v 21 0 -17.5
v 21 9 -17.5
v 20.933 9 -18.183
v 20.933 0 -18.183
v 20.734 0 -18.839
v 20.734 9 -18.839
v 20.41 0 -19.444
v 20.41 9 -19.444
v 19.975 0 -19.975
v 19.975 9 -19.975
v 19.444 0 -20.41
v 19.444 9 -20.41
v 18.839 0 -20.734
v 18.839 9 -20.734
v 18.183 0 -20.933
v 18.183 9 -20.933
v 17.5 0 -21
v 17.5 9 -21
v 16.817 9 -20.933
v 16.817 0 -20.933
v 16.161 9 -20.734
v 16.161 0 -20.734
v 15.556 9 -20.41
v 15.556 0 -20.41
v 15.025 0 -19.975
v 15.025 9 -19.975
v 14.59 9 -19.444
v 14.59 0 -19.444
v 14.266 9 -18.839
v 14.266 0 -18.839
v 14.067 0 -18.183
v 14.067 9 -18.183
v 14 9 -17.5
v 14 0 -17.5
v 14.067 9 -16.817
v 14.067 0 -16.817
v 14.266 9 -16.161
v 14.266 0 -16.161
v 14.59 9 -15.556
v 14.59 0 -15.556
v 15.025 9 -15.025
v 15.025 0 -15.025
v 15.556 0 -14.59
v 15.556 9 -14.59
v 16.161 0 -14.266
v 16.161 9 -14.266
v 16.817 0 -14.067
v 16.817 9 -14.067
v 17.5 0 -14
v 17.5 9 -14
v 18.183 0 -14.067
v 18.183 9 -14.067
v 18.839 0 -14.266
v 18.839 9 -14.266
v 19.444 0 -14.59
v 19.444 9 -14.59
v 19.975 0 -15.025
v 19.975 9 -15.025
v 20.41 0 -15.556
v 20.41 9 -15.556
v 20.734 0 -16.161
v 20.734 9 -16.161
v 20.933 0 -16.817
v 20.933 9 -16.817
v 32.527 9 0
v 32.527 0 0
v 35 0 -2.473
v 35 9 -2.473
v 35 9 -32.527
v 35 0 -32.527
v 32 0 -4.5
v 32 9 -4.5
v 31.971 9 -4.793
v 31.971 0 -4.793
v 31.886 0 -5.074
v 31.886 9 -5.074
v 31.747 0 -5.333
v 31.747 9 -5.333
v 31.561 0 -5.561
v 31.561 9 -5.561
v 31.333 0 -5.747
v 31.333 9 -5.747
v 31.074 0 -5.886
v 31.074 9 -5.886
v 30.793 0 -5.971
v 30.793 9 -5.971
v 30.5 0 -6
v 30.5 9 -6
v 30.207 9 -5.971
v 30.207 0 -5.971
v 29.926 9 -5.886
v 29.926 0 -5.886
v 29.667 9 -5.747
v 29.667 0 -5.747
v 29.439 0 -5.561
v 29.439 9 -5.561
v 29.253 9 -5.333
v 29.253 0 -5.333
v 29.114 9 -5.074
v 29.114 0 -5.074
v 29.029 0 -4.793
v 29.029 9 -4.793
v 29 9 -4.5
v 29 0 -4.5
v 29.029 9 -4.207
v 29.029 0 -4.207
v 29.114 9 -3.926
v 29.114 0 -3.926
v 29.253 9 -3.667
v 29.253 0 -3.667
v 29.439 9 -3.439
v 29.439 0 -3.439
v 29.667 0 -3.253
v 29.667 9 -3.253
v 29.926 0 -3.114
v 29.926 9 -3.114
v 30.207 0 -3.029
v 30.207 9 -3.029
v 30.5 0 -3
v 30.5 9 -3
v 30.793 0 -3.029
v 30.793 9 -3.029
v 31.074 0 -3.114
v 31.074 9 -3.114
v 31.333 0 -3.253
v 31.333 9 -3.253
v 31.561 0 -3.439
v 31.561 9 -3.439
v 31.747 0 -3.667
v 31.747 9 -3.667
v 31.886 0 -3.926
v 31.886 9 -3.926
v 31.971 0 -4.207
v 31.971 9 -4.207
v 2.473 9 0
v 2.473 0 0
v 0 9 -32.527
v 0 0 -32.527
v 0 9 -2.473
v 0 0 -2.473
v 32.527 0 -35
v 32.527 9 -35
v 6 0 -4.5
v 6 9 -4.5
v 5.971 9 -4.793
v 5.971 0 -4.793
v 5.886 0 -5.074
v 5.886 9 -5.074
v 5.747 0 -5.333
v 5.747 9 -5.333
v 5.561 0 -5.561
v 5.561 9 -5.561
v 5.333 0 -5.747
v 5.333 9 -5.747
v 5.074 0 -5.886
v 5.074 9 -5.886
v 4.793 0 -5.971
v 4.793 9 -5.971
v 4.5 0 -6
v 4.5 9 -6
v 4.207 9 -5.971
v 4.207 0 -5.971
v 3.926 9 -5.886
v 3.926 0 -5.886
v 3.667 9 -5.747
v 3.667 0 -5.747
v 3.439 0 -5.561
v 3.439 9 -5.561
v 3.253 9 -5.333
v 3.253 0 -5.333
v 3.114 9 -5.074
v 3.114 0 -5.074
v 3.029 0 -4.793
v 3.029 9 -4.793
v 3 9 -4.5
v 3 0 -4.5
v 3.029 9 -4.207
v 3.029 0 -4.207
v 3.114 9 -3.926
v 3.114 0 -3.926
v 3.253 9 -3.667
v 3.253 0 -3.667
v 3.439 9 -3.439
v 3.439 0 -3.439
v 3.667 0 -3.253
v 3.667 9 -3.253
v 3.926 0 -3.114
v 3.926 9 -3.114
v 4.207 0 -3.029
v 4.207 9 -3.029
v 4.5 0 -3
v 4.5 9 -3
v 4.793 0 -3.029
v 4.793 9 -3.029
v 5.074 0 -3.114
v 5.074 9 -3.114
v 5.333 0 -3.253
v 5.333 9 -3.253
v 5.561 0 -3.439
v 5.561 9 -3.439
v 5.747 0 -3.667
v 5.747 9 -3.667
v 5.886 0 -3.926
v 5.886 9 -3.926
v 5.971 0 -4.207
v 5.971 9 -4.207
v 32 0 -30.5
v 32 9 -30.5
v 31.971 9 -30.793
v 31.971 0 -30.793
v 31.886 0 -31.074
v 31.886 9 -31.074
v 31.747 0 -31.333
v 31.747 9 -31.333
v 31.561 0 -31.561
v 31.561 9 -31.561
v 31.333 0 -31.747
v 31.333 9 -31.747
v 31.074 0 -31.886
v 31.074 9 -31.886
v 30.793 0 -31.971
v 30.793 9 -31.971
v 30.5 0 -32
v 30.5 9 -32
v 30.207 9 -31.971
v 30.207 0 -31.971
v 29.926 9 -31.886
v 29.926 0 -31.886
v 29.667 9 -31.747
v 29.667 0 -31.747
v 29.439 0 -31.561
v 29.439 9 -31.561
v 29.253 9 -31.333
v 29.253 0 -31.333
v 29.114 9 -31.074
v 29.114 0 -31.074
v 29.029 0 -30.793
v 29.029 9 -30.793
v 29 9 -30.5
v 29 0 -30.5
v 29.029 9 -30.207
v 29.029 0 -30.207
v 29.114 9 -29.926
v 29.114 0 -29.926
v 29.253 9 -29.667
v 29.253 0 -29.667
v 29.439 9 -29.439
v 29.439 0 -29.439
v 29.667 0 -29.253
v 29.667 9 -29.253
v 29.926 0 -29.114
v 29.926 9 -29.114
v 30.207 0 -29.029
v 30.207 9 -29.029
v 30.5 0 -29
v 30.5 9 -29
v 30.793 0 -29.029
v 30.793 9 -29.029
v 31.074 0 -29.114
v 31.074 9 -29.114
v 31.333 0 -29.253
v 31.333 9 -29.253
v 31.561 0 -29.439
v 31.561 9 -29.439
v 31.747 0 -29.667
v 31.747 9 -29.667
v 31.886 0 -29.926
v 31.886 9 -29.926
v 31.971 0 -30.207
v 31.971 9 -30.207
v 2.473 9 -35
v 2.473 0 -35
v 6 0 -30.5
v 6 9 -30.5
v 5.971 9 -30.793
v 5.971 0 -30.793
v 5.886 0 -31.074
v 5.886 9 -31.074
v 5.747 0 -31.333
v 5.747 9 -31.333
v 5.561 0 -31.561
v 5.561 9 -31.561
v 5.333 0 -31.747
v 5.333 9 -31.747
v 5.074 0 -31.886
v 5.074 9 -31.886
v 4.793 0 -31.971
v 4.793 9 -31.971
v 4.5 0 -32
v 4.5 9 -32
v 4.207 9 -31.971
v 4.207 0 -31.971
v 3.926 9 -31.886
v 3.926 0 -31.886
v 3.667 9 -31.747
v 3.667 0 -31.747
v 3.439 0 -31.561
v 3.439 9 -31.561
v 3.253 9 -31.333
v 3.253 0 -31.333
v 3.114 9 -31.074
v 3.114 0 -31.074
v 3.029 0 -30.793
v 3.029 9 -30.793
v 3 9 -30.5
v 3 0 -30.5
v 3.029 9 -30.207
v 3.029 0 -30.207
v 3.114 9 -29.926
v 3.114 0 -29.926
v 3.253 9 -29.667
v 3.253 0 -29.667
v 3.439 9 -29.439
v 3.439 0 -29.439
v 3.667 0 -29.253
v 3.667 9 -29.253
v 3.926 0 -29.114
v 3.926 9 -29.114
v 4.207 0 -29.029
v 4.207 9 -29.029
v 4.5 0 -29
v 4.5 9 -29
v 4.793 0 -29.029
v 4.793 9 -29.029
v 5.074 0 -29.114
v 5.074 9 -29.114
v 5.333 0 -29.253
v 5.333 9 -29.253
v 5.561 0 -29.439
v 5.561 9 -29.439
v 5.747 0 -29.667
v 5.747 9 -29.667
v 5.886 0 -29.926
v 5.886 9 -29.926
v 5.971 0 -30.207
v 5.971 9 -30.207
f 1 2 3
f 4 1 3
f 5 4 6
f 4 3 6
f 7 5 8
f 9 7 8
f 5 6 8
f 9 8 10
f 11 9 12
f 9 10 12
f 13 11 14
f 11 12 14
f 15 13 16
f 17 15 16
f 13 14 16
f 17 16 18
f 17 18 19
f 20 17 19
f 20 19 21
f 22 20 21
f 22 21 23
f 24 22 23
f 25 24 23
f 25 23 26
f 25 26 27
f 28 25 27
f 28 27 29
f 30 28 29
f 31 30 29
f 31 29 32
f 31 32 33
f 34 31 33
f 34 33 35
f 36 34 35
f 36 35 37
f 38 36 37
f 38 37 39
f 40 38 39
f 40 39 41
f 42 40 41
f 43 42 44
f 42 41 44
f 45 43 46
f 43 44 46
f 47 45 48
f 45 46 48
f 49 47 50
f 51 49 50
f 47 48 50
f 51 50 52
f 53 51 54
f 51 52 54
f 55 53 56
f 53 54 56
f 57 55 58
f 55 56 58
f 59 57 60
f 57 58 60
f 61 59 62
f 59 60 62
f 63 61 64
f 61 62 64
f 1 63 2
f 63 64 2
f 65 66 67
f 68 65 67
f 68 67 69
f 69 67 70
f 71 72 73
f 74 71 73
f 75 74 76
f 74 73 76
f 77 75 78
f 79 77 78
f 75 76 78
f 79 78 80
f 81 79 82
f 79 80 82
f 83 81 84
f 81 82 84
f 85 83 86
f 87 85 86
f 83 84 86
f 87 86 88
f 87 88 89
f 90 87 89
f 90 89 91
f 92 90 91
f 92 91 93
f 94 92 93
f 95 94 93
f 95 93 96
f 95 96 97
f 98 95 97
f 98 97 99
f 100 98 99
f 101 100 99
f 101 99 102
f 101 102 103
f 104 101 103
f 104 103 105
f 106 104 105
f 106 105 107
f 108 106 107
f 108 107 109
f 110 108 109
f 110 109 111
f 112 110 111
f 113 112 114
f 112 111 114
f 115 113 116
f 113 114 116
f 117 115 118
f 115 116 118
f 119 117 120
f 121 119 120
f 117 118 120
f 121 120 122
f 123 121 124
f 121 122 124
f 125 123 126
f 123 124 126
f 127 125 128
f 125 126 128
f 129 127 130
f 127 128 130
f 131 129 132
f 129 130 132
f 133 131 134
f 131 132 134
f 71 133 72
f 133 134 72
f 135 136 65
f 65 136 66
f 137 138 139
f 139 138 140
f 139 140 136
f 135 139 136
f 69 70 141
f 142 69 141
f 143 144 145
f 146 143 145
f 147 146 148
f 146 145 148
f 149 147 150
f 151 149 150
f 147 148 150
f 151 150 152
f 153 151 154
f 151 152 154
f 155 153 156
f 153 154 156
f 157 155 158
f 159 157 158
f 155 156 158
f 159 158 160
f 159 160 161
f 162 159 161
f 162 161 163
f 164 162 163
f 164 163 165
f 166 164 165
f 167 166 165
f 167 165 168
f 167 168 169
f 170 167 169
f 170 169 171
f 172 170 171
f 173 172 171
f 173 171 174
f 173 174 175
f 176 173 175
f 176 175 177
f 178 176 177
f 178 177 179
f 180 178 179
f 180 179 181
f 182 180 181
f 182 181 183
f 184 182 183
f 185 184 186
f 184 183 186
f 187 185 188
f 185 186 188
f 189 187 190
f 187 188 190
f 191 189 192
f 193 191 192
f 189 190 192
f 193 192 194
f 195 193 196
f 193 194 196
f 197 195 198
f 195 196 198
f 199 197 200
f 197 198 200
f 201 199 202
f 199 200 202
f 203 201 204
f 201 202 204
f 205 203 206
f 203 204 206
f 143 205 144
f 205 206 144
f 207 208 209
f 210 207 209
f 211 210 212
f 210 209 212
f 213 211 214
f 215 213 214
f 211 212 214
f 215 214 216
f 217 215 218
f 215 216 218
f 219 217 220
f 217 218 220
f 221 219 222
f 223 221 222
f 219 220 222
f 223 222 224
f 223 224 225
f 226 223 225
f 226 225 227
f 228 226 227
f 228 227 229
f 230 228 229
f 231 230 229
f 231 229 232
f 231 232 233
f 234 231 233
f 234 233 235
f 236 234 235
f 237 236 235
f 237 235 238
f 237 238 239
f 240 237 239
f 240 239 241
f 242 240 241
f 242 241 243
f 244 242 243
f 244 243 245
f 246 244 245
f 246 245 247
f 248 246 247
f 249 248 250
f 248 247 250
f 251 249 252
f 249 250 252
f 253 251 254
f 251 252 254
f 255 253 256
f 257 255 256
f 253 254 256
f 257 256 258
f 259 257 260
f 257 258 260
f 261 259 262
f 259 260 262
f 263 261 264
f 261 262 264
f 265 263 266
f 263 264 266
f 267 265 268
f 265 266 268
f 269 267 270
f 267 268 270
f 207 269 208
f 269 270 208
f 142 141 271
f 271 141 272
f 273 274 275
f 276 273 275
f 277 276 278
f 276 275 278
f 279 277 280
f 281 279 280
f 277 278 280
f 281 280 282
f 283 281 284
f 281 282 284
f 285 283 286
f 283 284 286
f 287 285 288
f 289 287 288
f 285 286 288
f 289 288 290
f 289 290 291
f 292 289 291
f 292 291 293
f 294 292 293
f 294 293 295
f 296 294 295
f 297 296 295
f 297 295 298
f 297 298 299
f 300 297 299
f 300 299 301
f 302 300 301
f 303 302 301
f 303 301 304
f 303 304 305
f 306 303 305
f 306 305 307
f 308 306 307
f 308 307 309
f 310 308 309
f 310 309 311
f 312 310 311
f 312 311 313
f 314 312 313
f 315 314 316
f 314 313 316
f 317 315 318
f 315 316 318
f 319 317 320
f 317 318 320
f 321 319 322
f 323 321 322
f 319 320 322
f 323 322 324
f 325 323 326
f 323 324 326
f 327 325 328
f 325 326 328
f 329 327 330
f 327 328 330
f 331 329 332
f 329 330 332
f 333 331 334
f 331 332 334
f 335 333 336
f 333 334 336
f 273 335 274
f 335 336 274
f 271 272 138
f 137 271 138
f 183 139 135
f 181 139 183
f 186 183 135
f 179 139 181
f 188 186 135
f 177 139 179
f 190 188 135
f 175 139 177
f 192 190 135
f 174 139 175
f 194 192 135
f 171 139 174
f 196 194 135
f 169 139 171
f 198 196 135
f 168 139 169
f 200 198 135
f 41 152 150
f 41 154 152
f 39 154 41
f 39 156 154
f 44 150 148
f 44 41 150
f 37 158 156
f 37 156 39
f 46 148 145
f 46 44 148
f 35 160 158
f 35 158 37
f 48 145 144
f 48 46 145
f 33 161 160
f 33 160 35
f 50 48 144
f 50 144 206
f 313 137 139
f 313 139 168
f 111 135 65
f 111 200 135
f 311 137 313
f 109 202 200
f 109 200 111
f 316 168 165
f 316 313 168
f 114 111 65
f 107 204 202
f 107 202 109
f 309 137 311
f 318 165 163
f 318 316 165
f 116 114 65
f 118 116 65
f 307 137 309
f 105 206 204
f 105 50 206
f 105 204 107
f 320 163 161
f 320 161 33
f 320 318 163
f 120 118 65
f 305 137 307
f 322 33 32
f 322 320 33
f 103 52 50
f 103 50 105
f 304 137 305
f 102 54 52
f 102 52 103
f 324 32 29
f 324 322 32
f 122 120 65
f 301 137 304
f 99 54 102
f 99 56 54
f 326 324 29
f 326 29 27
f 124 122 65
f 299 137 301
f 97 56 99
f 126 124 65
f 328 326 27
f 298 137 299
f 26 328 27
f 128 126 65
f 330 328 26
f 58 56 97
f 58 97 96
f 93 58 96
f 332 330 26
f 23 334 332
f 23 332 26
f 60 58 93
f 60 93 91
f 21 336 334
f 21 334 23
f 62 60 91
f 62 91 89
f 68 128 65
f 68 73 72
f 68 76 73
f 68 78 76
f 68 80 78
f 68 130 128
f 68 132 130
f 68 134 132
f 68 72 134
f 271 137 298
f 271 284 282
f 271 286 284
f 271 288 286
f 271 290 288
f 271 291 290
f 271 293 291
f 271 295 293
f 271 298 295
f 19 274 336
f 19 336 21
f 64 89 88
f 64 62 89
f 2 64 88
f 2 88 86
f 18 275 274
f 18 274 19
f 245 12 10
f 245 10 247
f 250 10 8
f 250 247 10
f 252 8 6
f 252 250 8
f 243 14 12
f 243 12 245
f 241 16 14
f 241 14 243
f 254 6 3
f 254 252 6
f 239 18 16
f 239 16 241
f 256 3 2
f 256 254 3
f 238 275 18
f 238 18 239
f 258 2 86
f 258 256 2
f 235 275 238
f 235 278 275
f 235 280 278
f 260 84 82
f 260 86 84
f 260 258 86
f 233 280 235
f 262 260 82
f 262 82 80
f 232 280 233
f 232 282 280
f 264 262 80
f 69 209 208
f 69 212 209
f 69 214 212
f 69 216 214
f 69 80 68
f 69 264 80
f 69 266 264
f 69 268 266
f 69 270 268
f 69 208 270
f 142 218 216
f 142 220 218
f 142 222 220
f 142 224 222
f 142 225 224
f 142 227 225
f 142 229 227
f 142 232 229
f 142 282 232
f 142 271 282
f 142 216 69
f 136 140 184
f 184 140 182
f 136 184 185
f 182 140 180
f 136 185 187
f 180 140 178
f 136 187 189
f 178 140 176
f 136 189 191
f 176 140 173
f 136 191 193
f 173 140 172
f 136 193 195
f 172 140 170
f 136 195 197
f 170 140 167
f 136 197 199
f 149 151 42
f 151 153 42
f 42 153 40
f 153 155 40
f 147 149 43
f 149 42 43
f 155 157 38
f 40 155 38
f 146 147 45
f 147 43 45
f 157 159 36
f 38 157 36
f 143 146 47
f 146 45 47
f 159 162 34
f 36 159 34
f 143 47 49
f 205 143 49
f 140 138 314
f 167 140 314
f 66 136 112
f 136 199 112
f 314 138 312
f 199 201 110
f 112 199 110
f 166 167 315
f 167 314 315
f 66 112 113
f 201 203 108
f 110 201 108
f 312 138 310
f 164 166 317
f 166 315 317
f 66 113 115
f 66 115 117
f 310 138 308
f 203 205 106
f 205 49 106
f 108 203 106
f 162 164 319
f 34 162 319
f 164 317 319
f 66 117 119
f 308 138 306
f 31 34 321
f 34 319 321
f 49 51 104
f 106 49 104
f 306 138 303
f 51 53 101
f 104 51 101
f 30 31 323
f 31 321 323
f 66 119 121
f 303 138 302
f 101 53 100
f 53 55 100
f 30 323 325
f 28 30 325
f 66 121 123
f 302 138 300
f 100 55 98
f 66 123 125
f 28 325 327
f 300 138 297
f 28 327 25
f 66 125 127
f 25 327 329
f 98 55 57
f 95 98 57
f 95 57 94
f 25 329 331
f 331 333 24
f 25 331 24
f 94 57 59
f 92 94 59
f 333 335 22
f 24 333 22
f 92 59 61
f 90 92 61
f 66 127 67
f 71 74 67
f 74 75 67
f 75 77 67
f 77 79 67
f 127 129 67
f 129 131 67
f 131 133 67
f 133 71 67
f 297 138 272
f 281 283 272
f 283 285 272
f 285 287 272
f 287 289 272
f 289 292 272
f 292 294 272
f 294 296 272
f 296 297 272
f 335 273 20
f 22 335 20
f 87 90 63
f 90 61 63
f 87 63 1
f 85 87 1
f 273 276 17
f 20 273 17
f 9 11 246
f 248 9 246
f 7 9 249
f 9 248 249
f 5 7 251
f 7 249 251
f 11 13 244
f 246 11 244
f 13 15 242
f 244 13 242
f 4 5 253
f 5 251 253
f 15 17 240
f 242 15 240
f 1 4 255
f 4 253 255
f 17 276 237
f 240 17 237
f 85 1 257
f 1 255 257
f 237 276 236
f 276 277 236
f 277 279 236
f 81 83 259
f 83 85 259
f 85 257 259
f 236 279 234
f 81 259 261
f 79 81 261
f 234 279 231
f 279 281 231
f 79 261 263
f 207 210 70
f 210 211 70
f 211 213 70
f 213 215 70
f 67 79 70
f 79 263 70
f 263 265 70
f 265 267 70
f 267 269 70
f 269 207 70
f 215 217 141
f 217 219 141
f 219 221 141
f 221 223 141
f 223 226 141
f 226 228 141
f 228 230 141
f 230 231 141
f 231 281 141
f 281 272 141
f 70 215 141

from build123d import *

# Parameters (mm, degrees)
SALIENTE_EXTRUIR1_DEPTH = 9
CROQUIS2_R              = 3.5
CORTAR_EXTRUIR1_DEPTH   = 10
CROQUIS3_R              = 1.5
CORTAR_EXTRUIR2_DEPTH   = 10


with BuildPart() as part:
    # Croquis1 → Saliente-Extruir1 (new body)
    with BuildSketch(Plane(origin=(0, 0, 0), x_dir=(1, 0, 0), z_dir=(0, 1, 0))):
        Polygon((0, 2.473088065), (2.473088065, 0), (32.526911935, 0), (35, 2.473088065), (35, 32.526911935), (32.526911935, 35), (2.473088065, 35), (0, 32.526911935), align=None)
    extrude(amount=SALIENTE_EXTRUIR1_DEPTH)

    # Croquis2 → Cortar-Extruir1 (cut, through all)
    with BuildSketch(Plane(origin=(0, 9, 0), x_dir=(1, 0, 0), z_dir=(0, 1, 0))):
        with Locations((17.5, 17.5)):
            Circle(CROQUIS2_R)
    extrude(amount=-CORTAR_EXTRUIR1_DEPTH, mode=Mode.SUBTRACT)

    # Croquis3 → Cortar-Extruir2 (cut, through all)
    with BuildSketch(Plane(origin=(0, 9, 0), x_dir=(1, 0, 0), z_dir=(0, 1, 0))):
        with Locations((4.5, 30.5)):
            Circle(CROQUIS3_R)
        with Locations((30.5, 30.5)):
            Circle(CROQUIS3_R)
        with Locations((30.5, 4.5)):
            Circle(CROQUIS3_R)
        with Locations((4.5, 4.5)):
            Circle(CROQUIS3_R)
    extrude(amount=-CORTAR_EXTRUIR2_DEPTH, mode=Mode.SUBTRACT)


solid = part.part
